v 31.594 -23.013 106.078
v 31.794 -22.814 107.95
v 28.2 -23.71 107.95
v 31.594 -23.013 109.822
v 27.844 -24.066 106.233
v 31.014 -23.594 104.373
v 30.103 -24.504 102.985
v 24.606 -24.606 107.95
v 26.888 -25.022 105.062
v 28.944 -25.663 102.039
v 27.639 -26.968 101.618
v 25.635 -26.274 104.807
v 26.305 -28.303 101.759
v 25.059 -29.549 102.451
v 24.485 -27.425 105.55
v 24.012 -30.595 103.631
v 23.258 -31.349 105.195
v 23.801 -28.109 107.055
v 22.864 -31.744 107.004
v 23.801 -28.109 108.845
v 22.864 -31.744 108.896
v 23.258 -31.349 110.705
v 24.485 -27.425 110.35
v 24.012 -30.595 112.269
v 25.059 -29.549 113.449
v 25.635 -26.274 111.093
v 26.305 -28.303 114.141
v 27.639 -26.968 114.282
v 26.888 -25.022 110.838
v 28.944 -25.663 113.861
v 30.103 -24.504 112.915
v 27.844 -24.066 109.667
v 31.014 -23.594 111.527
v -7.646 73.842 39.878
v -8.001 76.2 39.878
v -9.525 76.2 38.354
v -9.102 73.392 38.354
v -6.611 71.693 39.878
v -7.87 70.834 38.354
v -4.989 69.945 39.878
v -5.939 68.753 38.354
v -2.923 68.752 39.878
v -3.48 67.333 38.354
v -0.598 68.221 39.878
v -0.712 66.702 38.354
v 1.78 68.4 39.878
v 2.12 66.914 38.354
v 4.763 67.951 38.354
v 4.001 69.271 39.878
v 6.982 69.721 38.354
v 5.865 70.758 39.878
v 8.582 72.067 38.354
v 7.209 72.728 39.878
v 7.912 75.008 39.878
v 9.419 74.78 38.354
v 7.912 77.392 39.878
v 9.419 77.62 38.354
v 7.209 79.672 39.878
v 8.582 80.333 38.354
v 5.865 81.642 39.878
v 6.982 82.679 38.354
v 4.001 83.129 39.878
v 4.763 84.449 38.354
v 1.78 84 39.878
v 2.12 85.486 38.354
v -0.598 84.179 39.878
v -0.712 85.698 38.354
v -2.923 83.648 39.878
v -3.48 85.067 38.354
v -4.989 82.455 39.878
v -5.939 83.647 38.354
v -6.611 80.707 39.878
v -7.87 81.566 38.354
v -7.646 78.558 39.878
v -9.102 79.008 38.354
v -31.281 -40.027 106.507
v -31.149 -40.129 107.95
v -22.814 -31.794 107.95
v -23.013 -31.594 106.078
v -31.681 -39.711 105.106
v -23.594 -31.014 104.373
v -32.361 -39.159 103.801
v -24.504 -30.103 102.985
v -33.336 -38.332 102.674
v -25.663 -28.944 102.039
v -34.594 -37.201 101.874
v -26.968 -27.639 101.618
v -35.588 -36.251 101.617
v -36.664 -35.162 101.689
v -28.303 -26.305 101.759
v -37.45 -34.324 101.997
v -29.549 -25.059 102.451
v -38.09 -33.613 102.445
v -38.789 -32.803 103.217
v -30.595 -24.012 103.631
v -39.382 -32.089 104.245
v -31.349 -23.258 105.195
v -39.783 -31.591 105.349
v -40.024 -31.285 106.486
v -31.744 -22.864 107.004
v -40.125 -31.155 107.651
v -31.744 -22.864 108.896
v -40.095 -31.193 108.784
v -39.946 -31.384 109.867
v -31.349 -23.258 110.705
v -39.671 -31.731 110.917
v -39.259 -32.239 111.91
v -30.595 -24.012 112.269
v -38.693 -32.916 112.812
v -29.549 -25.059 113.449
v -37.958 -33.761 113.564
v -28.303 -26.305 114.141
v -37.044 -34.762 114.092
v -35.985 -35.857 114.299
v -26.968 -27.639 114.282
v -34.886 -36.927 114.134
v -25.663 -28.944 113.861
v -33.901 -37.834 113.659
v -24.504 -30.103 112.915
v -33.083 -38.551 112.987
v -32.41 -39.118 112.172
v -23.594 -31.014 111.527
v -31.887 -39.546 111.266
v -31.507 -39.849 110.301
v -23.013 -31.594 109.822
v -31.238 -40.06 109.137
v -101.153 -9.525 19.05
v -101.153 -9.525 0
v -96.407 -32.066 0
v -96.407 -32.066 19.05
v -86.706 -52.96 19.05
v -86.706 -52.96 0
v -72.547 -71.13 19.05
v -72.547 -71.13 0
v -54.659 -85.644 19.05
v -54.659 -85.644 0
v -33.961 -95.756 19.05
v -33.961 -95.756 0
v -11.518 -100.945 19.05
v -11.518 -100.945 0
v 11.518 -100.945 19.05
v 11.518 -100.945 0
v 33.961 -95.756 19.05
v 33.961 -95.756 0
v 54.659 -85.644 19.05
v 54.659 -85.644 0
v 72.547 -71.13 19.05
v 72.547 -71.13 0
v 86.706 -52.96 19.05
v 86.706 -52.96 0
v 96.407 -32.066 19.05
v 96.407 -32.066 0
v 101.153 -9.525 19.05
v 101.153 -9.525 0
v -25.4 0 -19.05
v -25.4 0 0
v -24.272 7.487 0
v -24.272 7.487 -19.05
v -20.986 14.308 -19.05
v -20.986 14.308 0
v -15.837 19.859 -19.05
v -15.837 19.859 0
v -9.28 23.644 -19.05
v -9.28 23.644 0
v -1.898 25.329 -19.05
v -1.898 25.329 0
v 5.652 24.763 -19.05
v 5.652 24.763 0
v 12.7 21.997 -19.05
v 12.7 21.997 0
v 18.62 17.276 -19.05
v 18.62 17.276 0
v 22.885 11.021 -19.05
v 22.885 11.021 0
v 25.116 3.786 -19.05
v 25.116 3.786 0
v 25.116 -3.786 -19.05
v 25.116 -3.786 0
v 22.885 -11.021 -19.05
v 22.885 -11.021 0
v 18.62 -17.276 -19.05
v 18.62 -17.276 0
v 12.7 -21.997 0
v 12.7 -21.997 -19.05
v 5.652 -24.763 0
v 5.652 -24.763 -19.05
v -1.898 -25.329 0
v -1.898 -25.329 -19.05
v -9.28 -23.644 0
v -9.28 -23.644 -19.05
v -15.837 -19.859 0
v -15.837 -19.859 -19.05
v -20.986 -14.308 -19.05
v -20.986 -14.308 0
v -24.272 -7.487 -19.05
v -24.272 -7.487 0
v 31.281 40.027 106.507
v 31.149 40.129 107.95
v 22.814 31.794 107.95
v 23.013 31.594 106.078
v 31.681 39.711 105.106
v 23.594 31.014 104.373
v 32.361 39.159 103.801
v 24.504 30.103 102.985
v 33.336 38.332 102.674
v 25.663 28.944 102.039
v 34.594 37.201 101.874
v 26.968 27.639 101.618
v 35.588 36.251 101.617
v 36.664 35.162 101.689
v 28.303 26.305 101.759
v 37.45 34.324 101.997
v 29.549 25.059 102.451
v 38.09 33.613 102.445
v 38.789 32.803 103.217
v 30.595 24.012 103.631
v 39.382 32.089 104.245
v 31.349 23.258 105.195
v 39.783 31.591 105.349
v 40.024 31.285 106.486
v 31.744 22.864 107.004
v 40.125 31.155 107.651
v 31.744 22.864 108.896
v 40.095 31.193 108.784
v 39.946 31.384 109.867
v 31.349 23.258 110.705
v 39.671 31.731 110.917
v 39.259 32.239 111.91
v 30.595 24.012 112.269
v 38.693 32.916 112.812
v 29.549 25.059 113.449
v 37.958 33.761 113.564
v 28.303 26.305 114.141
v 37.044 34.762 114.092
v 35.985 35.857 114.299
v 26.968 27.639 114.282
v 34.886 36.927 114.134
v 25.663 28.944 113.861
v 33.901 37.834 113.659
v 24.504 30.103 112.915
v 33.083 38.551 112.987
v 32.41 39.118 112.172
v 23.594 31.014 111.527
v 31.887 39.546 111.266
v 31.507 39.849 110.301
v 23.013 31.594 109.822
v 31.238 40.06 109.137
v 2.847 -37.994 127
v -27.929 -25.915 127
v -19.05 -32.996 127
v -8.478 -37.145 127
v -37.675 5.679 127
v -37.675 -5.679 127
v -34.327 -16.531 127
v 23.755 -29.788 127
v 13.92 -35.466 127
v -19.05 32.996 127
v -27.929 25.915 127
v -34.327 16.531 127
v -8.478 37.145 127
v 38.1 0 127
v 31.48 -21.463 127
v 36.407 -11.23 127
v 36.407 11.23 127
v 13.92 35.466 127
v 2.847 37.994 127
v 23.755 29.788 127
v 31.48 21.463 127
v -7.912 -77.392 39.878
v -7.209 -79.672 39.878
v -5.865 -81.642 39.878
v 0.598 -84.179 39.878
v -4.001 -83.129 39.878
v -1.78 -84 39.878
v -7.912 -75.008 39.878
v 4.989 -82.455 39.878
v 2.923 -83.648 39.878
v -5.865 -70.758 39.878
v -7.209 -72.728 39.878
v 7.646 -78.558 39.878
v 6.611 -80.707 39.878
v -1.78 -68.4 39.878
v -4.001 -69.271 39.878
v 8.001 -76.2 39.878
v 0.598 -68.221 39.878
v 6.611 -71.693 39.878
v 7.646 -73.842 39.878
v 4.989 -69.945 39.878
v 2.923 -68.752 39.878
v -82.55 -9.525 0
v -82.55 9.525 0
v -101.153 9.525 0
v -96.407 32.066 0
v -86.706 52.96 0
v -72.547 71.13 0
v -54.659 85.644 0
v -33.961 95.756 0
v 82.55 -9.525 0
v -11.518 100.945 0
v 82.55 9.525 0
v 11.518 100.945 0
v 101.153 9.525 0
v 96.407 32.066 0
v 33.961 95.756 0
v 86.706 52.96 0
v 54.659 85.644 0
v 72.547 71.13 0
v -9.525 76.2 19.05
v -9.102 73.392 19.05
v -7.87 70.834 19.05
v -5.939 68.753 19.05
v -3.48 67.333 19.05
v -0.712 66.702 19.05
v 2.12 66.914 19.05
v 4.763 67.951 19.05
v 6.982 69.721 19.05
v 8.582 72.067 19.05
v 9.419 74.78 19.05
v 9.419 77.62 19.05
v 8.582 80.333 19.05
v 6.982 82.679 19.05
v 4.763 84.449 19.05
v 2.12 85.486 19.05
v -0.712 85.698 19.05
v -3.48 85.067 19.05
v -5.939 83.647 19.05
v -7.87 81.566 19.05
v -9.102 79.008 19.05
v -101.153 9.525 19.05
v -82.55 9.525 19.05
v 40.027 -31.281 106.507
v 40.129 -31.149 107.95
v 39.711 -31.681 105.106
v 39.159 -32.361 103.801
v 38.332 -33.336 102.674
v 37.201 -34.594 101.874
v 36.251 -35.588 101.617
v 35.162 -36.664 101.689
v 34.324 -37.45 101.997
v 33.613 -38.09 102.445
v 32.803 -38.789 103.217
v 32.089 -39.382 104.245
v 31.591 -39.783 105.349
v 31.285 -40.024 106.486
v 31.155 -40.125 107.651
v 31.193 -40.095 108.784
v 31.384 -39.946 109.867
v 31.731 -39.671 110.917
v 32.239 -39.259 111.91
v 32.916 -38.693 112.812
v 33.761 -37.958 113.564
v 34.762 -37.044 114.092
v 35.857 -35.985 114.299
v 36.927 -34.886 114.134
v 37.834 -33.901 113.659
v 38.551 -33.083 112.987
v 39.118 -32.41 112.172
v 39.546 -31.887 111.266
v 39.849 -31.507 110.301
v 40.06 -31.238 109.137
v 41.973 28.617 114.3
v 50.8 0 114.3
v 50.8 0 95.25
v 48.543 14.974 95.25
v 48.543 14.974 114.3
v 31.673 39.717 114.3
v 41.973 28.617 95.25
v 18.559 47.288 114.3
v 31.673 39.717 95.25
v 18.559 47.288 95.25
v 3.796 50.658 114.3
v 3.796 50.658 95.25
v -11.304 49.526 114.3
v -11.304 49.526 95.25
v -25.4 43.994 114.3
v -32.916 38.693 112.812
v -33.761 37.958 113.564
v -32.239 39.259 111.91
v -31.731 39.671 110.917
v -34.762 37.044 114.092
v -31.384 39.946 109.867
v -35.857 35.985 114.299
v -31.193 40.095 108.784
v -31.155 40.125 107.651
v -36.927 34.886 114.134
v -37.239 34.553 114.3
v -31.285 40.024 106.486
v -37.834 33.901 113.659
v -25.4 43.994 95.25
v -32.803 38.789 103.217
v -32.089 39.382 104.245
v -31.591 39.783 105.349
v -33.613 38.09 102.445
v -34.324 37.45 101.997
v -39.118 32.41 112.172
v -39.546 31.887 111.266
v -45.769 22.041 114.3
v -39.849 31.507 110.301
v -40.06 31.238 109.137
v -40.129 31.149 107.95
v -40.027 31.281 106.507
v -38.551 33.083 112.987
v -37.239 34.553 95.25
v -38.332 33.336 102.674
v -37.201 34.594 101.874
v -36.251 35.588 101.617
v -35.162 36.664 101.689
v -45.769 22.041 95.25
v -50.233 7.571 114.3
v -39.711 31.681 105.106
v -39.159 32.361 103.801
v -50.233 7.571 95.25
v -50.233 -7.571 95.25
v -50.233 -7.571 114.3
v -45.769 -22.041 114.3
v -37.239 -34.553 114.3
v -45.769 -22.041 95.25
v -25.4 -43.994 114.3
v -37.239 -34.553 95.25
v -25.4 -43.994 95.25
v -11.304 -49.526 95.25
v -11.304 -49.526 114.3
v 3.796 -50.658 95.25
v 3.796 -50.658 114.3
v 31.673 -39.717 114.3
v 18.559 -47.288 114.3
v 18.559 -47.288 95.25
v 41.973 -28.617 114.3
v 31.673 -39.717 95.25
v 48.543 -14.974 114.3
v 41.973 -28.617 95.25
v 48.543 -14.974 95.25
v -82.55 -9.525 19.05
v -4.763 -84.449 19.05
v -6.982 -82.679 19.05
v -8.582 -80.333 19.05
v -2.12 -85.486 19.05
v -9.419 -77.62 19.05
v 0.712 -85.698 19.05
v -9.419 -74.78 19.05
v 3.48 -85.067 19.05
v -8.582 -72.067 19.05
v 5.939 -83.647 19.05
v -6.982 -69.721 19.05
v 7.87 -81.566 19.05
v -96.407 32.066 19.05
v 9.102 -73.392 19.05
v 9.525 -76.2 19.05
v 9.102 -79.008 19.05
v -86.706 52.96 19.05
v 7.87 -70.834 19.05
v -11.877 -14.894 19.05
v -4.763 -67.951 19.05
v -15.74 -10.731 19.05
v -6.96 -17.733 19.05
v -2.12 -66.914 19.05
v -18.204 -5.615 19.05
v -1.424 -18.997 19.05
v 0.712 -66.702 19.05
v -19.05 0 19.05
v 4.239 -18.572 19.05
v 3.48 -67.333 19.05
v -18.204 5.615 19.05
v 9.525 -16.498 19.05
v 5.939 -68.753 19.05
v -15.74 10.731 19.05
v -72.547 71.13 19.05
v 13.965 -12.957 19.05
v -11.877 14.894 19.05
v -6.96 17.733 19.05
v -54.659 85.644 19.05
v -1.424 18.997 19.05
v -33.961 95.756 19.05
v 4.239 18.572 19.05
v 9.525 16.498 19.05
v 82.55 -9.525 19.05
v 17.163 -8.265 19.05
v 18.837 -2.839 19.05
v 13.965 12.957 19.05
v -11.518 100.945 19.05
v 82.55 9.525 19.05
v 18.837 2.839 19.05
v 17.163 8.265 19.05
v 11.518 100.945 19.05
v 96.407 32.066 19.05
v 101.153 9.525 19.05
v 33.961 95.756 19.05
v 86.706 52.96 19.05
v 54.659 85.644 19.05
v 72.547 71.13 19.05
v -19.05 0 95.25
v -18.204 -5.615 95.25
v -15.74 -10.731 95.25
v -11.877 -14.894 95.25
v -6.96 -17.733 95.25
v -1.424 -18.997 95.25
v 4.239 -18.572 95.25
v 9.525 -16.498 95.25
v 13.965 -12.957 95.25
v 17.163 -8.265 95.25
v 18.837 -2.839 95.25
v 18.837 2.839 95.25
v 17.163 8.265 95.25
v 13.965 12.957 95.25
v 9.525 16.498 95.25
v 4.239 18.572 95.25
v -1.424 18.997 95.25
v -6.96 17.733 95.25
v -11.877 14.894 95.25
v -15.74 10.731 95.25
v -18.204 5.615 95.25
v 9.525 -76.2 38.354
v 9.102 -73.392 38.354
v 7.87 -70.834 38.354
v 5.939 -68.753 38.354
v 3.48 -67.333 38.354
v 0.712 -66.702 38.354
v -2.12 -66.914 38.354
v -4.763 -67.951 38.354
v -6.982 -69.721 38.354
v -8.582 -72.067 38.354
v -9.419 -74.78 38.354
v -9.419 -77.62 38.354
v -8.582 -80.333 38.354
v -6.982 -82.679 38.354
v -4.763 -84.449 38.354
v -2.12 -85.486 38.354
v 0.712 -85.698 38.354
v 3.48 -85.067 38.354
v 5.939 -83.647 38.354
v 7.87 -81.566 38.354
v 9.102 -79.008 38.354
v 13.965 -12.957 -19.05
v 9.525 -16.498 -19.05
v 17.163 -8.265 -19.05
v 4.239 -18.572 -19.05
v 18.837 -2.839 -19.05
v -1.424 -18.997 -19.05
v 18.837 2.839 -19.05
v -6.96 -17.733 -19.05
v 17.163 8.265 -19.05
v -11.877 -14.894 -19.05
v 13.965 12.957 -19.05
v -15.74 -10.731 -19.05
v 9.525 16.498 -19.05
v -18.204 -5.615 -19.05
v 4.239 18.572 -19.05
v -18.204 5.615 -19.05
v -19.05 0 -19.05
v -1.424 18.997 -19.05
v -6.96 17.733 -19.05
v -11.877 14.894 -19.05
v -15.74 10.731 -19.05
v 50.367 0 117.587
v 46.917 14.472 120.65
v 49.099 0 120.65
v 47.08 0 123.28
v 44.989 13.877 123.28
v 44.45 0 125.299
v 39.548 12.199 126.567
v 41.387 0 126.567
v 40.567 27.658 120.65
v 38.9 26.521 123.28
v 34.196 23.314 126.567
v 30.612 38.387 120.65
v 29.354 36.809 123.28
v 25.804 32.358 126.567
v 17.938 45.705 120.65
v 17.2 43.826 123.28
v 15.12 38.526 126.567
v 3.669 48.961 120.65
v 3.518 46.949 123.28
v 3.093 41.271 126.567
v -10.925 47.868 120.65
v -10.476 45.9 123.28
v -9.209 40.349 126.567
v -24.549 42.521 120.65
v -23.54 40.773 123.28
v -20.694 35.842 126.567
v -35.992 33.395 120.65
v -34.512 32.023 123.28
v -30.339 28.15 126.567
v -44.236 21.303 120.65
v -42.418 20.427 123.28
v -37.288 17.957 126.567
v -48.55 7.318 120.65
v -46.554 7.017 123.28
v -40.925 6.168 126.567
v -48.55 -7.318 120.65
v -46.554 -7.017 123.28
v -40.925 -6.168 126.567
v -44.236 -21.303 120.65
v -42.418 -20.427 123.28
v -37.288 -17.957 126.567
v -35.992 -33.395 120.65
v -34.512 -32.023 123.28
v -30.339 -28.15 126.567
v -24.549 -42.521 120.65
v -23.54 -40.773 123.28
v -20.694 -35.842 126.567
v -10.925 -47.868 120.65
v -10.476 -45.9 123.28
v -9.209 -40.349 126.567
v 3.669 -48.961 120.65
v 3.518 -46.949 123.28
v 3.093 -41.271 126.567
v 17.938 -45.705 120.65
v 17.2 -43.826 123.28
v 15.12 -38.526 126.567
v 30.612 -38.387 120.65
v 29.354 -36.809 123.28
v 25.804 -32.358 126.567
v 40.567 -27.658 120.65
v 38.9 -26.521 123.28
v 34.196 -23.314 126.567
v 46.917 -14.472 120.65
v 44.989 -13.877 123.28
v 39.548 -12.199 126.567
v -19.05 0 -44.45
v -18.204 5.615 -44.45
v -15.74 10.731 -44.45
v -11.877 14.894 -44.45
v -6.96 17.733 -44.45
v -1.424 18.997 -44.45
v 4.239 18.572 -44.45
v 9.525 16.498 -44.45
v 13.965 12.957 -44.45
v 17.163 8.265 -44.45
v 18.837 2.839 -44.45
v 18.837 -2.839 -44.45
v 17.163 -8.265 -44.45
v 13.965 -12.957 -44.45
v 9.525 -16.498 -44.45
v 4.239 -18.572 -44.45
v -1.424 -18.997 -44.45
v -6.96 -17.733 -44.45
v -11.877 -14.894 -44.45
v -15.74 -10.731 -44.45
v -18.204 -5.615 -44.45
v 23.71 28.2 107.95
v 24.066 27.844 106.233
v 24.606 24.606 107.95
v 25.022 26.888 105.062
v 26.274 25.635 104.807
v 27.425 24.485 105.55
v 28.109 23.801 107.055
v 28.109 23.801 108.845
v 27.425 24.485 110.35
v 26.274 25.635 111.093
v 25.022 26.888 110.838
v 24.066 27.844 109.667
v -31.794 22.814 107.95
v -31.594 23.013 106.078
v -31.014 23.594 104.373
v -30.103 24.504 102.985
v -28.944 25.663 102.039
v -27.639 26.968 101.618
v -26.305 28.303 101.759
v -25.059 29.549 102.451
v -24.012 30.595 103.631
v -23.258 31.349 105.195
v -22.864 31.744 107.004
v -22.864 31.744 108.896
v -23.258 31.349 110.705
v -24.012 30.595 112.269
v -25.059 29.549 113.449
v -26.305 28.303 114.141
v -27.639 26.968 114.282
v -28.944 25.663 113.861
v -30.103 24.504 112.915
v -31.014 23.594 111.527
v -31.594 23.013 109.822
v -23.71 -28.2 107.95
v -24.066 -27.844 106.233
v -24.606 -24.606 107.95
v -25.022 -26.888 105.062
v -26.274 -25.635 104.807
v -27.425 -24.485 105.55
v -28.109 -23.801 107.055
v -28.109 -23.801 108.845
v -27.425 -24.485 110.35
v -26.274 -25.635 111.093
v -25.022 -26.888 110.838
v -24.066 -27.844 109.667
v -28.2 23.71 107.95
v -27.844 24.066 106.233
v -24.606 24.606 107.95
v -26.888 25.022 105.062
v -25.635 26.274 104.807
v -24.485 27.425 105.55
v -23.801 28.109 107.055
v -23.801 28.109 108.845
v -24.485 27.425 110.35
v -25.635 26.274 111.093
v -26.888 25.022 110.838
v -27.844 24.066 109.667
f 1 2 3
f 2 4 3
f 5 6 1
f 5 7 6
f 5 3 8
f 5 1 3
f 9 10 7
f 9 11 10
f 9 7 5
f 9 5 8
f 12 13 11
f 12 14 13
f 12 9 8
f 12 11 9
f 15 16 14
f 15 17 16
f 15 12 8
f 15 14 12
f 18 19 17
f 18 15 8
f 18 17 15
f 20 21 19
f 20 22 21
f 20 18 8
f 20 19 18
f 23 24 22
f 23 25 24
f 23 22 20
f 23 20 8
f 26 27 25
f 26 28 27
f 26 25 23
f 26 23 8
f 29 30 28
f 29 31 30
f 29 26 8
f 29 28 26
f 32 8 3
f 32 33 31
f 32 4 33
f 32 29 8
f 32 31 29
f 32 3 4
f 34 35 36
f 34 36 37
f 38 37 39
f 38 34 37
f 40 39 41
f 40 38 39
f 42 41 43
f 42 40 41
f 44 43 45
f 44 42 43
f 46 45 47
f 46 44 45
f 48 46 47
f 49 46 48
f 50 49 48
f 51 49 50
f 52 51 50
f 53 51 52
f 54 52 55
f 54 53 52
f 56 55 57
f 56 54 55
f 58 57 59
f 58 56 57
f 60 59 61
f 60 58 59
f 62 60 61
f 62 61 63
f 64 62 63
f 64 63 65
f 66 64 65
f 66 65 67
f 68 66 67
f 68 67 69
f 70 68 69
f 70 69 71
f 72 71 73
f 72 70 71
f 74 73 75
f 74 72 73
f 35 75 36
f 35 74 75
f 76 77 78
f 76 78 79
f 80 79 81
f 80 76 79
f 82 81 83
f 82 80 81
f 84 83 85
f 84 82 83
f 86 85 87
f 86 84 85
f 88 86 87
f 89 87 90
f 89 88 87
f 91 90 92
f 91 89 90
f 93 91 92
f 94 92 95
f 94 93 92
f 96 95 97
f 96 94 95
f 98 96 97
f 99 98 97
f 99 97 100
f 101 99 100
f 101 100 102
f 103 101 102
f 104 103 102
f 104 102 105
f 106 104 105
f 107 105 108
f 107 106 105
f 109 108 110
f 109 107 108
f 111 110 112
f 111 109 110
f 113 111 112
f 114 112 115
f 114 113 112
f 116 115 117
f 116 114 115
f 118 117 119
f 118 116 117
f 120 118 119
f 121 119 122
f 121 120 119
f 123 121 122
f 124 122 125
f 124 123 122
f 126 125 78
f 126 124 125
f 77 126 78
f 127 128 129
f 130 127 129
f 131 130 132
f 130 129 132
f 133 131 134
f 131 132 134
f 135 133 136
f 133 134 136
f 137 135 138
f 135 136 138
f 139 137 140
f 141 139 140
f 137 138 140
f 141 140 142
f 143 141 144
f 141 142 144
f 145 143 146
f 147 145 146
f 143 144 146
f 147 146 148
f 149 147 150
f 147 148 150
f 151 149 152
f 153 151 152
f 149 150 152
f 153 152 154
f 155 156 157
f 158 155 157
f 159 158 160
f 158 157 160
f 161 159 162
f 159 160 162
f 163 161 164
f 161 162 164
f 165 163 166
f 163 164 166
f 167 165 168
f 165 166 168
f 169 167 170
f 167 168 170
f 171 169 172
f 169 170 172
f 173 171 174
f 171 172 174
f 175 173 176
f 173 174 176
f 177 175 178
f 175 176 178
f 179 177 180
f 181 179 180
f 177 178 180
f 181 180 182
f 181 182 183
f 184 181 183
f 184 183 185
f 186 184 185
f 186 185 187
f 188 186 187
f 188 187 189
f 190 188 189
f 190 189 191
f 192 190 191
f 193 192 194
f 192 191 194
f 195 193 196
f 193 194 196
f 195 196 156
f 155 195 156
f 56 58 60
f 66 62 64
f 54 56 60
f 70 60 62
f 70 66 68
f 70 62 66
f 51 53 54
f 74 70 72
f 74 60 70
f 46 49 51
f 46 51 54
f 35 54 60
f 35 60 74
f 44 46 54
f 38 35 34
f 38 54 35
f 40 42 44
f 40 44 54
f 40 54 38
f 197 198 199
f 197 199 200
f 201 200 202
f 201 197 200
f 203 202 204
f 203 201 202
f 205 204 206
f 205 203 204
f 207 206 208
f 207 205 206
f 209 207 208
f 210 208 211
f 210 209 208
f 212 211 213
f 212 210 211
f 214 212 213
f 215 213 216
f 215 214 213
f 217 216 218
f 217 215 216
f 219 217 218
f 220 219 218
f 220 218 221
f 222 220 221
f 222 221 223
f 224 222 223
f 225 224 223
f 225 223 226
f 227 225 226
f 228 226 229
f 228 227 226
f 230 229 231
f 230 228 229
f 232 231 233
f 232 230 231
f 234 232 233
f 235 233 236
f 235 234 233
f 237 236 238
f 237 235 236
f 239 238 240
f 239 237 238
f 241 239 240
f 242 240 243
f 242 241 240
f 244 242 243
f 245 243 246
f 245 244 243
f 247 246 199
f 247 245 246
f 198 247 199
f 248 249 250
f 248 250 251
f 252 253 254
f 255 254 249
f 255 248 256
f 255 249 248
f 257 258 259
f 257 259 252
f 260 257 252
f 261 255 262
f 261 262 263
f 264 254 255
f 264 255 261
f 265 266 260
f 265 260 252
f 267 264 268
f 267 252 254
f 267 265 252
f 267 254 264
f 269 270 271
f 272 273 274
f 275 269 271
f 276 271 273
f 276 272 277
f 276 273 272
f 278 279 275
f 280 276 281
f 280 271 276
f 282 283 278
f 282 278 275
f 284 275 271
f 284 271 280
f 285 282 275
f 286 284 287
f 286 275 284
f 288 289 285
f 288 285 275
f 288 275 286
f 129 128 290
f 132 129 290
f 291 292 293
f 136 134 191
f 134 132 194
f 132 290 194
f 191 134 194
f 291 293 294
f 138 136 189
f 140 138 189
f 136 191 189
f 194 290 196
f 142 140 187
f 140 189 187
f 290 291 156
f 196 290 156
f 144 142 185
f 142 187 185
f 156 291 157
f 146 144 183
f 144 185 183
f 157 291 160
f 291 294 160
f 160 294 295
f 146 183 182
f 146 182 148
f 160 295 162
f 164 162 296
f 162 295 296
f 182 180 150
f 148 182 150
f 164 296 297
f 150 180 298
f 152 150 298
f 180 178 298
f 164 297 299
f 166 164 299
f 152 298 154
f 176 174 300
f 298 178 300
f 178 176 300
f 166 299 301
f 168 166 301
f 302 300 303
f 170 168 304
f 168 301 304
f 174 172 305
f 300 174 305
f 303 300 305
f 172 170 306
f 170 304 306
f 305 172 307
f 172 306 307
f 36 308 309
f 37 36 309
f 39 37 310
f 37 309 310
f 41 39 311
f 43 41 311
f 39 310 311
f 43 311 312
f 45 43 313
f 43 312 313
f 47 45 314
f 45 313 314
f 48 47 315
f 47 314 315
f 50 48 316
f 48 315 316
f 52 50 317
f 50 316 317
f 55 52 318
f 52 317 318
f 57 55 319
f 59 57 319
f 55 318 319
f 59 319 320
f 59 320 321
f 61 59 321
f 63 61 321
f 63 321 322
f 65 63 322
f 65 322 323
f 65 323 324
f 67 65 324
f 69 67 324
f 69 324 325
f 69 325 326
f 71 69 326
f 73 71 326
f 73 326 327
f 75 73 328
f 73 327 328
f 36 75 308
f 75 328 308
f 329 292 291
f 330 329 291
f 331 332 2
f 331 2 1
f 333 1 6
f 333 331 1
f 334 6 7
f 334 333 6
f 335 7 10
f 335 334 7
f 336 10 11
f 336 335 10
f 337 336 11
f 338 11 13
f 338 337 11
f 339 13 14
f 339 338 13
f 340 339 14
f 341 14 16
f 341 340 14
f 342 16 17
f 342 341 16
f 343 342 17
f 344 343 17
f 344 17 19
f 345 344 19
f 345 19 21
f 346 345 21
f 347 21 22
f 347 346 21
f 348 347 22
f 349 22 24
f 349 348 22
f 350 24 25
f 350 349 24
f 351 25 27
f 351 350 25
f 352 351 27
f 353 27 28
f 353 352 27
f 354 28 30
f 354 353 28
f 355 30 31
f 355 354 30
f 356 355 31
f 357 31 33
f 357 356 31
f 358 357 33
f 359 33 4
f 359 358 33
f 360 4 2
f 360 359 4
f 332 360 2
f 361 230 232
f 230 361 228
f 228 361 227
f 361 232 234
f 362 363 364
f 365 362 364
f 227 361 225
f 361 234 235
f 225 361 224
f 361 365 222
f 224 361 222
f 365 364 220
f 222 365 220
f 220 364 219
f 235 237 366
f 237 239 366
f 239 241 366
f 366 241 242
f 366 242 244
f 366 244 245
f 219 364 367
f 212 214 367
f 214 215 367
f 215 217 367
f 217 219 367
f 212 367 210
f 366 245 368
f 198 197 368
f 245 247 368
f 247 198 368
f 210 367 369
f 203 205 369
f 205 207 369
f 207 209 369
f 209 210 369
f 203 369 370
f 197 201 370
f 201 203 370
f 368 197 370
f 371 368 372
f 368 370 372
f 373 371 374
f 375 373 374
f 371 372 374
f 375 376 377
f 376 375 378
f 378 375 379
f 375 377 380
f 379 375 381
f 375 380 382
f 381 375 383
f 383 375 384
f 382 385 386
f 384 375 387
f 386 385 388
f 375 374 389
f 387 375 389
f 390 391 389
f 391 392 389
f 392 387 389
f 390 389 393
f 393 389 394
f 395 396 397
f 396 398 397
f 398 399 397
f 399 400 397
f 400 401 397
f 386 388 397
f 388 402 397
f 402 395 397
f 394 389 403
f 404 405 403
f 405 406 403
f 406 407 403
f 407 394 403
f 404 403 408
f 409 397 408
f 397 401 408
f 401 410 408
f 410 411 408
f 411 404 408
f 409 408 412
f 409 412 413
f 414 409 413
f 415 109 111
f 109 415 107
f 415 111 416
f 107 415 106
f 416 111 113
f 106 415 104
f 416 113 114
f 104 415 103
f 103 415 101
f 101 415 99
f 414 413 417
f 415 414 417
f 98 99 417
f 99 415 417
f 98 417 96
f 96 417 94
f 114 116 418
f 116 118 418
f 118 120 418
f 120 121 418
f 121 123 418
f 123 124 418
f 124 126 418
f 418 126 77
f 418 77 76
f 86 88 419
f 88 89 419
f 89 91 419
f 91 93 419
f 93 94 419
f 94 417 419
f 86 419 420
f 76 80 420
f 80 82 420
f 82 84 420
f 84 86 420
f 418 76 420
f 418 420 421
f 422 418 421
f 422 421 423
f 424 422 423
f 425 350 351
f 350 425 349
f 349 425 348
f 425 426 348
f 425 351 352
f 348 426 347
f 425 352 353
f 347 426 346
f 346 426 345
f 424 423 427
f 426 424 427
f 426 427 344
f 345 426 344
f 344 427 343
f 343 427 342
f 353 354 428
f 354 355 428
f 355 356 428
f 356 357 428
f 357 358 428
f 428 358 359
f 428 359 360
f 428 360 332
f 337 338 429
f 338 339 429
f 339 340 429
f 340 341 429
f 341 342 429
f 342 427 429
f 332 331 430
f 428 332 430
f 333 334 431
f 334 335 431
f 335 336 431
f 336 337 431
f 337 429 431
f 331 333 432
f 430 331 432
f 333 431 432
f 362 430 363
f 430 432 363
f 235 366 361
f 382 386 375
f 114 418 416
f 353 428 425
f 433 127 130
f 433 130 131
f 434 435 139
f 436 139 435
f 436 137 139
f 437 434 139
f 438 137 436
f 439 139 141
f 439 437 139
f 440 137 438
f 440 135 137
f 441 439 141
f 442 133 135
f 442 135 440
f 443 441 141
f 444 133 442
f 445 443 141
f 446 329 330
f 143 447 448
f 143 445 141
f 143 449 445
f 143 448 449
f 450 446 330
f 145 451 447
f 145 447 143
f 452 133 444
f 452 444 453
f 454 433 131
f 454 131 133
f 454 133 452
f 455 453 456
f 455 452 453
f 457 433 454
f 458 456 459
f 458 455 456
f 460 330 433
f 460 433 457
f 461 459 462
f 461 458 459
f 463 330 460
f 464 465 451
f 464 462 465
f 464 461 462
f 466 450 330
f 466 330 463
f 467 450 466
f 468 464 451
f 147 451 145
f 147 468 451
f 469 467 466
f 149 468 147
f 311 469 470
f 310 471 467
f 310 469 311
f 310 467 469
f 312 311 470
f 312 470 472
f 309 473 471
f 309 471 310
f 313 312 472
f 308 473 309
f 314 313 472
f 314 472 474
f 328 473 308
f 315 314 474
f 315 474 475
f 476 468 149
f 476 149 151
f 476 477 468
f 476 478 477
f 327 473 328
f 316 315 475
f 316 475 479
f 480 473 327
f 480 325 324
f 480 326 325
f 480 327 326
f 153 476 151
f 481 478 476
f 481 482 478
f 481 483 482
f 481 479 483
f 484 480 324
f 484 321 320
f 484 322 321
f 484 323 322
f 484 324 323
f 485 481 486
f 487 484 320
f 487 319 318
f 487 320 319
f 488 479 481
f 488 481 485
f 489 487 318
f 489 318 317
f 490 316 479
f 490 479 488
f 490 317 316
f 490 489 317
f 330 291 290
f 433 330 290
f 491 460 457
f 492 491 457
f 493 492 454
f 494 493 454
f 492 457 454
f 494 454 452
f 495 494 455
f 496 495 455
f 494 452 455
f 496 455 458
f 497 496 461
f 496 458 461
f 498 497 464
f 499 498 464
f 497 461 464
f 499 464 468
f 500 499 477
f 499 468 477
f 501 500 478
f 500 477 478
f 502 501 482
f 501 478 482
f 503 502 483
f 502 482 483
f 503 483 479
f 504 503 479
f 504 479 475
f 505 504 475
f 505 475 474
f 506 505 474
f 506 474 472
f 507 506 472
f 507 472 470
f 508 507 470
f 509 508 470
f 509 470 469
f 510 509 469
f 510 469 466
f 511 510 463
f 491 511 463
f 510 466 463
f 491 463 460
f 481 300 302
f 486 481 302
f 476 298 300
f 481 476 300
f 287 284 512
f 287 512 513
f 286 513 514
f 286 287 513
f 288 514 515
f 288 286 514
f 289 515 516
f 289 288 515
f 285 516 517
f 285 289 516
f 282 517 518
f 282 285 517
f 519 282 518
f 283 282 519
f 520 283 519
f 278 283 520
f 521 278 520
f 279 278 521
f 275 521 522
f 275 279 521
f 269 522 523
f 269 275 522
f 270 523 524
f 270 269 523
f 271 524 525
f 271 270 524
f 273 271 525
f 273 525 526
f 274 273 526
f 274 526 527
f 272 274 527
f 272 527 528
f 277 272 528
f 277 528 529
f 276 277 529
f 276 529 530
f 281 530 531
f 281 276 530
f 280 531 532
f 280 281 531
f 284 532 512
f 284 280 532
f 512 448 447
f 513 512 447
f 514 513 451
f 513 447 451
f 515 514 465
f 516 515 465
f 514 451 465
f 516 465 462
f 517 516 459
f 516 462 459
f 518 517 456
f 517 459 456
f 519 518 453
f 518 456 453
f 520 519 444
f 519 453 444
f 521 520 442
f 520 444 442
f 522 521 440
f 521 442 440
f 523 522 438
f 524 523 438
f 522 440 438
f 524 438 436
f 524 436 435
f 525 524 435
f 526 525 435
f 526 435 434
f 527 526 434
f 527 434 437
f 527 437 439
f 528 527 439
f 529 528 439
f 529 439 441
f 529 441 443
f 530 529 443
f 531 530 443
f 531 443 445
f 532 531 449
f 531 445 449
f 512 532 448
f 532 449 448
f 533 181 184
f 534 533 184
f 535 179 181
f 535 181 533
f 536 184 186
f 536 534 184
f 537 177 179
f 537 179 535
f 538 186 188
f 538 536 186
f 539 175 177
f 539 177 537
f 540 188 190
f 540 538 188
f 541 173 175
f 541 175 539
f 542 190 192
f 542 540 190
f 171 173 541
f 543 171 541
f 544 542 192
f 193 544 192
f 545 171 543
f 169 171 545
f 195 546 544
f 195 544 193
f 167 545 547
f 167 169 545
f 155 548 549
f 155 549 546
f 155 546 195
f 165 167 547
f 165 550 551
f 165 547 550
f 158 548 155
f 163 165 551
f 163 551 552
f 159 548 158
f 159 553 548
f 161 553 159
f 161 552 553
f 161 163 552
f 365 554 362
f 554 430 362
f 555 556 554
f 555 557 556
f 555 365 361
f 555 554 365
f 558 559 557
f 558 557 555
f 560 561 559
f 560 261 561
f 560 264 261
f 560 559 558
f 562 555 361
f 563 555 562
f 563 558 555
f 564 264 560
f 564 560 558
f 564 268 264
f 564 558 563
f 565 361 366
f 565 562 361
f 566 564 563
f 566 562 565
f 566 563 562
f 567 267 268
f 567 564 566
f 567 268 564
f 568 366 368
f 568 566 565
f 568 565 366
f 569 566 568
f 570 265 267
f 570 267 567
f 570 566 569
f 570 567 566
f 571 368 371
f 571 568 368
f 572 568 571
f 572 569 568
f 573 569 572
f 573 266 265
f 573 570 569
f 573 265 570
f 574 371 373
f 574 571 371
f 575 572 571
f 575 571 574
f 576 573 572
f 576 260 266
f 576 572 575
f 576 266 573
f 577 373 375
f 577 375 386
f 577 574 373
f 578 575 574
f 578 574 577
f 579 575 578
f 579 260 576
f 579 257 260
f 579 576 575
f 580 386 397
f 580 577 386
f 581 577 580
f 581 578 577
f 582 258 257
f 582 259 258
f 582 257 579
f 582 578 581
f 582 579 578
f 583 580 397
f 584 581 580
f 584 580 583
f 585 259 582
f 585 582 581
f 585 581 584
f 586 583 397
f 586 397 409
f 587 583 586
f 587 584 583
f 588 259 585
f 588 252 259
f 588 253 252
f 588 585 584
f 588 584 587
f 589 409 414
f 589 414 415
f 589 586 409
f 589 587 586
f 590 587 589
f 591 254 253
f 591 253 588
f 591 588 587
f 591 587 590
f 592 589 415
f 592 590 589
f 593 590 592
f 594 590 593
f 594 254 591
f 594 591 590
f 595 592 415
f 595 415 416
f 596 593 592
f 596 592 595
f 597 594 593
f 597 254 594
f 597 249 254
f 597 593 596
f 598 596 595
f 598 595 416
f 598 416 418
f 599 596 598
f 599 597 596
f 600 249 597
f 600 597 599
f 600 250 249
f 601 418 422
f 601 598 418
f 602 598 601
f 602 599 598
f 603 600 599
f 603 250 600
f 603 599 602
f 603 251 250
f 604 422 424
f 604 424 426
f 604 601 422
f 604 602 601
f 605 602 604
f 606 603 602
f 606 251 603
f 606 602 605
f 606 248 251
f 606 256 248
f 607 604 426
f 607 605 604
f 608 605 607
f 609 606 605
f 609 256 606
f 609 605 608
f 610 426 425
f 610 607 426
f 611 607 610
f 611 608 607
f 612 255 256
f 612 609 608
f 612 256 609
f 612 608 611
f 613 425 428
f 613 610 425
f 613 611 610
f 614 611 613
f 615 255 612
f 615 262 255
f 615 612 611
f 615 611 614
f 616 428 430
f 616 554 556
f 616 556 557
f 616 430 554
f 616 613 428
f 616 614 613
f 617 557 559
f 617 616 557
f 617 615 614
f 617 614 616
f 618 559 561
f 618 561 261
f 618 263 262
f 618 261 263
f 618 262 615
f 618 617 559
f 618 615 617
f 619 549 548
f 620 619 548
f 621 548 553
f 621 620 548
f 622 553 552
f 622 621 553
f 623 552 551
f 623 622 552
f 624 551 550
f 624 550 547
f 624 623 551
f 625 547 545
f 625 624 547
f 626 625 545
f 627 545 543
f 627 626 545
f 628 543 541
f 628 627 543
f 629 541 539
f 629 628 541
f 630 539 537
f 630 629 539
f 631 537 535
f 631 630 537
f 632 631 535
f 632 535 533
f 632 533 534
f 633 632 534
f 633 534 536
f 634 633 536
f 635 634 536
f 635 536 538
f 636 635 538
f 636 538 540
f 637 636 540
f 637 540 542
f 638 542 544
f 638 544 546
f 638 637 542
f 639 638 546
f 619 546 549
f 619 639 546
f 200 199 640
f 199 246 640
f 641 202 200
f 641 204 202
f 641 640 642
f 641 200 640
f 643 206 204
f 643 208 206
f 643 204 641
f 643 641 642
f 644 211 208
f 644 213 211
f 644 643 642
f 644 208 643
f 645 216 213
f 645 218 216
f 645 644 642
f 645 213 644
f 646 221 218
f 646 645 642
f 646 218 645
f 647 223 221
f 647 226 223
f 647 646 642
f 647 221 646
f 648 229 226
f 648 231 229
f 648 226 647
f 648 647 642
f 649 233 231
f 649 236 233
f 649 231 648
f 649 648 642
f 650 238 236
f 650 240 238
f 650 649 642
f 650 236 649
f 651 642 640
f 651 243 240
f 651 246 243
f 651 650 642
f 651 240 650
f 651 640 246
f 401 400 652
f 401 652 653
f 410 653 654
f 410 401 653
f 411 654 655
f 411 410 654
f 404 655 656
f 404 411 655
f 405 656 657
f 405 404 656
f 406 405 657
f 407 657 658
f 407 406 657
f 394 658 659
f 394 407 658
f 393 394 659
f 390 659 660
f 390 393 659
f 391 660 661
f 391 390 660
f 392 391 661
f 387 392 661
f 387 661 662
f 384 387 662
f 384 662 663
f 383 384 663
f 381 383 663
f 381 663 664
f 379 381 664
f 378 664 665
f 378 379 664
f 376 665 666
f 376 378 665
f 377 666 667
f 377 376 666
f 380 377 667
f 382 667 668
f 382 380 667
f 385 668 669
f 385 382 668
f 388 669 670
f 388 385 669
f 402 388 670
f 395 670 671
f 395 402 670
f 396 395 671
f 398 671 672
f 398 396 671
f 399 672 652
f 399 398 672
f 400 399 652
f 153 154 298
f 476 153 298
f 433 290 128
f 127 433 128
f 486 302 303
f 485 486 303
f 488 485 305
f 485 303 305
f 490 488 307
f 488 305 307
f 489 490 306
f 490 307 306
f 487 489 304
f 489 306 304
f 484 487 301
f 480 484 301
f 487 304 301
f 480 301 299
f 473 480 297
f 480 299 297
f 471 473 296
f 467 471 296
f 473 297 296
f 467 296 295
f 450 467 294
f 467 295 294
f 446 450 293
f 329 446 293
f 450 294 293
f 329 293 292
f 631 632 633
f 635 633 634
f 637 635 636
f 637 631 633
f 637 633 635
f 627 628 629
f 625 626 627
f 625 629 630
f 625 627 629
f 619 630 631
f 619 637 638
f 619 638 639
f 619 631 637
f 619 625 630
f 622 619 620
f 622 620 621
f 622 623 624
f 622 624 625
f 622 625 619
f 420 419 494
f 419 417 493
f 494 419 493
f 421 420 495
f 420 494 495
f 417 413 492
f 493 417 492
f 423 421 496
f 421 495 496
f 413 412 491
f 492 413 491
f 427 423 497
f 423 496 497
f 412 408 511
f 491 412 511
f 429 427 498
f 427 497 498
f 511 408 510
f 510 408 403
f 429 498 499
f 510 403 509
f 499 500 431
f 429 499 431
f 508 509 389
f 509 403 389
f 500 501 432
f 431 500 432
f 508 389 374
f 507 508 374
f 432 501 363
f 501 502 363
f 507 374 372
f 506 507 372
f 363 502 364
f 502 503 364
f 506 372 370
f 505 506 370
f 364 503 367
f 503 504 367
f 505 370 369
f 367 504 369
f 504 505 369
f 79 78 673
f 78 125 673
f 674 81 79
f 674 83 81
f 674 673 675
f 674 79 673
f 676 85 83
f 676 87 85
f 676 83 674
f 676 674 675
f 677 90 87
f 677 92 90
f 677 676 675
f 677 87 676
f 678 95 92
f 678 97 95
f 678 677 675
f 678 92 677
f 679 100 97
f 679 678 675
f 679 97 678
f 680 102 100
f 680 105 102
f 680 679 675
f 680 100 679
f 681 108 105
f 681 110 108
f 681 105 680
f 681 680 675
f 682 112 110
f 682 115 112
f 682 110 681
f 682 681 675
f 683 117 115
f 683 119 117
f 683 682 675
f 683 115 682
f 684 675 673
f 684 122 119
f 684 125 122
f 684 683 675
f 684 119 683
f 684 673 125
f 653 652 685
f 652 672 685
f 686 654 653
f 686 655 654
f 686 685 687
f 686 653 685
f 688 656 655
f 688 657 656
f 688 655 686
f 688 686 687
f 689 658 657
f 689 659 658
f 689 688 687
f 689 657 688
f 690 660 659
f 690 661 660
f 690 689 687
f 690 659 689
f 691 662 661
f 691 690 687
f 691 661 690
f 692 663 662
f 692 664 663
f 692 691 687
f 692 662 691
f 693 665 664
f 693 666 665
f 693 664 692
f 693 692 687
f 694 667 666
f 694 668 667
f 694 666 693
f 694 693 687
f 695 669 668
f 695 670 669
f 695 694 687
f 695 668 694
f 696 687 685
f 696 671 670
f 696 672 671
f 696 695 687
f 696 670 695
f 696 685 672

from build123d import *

# Parameters (mm, degrees)
BOSS_EXTRUDE1_DEPTH = 19.05
SKETCH2_R           = 9.525
BOSS_EXTRUDE2_DEPTH = 20.828
CHAMFER1_SIZE       = 1.524
SKETCH3_R           = 19.05
BOSS_EXTRUDE3_DEPTH = 76.2
SKETCH4_R           = 25.4
BOSS_EXTRUDE4_DEPTH = 19.05
BOSS_EXTRUDE5_START = 25.4
SKETCH5_R           = 19.05
BOSS_EXTRUDE5_DEPTH = 25.4
SKETCH7_R           = 50.8
BOSS_EXTRUDE6_DEPTH = 31.75
CIRPATTERN2_COUNT   = 4
FILLET2_R           = 12.7


with BuildPart() as part:
    # Sketch1 → Boss-Extrude1 (new body)
    with BuildSketch(Plane.XY):
        with BuildLine():
            Line((101.152530245, -9.525), (82.55, -9.525))
            Line((82.55, -9.525), (82.55, 9.525))
            Line((82.55, 9.525), (101.152530245, 9.525))
            ThreePointArc((101.152530245, 9.525), (0, 101.6), (-101.152530245, 9.525))
            Line((-101.152530245, 9.525), (-82.55, 9.525))
            Line((-82.55, 9.525), (-82.55, -9.525))
            Line((-82.55, -9.525), (-101.152530245, -9.525))
            ThreePointArc((-101.152530245, -9.525), (0, -101.6), (101.152530245, -9.525))
        make_face()
    extrude(amount=BOSS_EXTRUDE1_DEPTH)

    # Sketch2 → Boss-Extrude2 (add)
    with BuildSketch(Plane.XY.offset(19.05)):
        with Locations((0, -76.2)):
            Circle(SKETCH2_R)
        with Locations(Location((0, 76.2, 0), (0, 0, 180))):
            Circle(SKETCH2_R)
    extrude(amount=BOSS_EXTRUDE2_DEPTH)

    # Chamfer1
    chamfer1_edges = [part.edges().sort_by_distance(p)[0] for p in [
        (-9.525, -76.2, 39.878),
        (9.525, 76.2, 39.878),
    ]]
    chamfer(chamfer1_edges, length=CHAMFER1_SIZE)

    # Sketch3 → Boss-Extrude3 (add)
    with BuildSketch(Plane.XY.offset(19.05)):
        with Locations(Location((0, 0, 0), (0, 0, 180))):
            Circle(SKETCH3_R)
    extrude(amount=BOSS_EXTRUDE3_DEPTH)

    # Sketch4 → Boss-Extrude4 (add)
    with BuildSketch(Plane(origin=(0, 0, 0), x_dir=(-1, 0, 0), z_dir=(0, 0, -1))):
        Circle(SKETCH4_R)
    extrude(amount=BOSS_EXTRUDE4_DEPTH)

    # Sketch5 → Boss-Extrude5 (add)
    with BuildSketch(Plane(origin=(0, 0, -19.05), x_dir=(-1, 0, 0), z_dir=(0, 0, -1)).offset(BOSS_EXTRUDE5_START)):
        Circle(SKETCH5_R)
    extrude(amount=-BOSS_EXTRUDE5_DEPTH)

    # Sketch7 → Boss-Extrude6 (add)
    with BuildSketch(Plane.XY.offset(95.25)):
        Circle(SKETCH7_R)
    extrude(amount=BOSS_EXTRUDE6_DEPTH)

    # Sketch22 → #92 (0.5) Diameter Hole1 (revolve, cut)
    with BuildSketch(Plane(origin=(35.921024484, 35.921024484, 107.95), x_dir=(-0.7071067811865464, 0.7071067811865488, 0), z_dir=(0, 0, 1))):
        Polygon((0, 0), (0, 16.002), (6.35, 12.186535069), (6.35, 0), align=None)
    f_92_0_5_diameter_hole1 = revolve(axis=Axis((40.411152545, 40.411152545, 107.95), (-0.7071067811865487, -0.7071067811865465, 0)), mode=Mode.SUBTRACT)

    # CirPattern2: #92 (0.5) Diameter Hole1 ×4 about axis
    cirpattern2_axis = Axis((0, 0, 127), (0, 0, -1))
    for i in range(1, CIRPATTERN2_COUNT):
        add(f_92_0_5_diameter_hole1.rotate(cirpattern2_axis, i * 360 / CIRPATTERN2_COUNT), mode=Mode.SUBTRACT)

    # Fillet2
    fillet2_edges = [part.edges().sort_by_distance(p)[0] for p in [
        (-50.8, 0, 127),
    ]]
    fillet(fillet2_edges, radius=FILLET2_R - 0.0001)  # a hair under: the kernel refuses the full size


solid = part.part
